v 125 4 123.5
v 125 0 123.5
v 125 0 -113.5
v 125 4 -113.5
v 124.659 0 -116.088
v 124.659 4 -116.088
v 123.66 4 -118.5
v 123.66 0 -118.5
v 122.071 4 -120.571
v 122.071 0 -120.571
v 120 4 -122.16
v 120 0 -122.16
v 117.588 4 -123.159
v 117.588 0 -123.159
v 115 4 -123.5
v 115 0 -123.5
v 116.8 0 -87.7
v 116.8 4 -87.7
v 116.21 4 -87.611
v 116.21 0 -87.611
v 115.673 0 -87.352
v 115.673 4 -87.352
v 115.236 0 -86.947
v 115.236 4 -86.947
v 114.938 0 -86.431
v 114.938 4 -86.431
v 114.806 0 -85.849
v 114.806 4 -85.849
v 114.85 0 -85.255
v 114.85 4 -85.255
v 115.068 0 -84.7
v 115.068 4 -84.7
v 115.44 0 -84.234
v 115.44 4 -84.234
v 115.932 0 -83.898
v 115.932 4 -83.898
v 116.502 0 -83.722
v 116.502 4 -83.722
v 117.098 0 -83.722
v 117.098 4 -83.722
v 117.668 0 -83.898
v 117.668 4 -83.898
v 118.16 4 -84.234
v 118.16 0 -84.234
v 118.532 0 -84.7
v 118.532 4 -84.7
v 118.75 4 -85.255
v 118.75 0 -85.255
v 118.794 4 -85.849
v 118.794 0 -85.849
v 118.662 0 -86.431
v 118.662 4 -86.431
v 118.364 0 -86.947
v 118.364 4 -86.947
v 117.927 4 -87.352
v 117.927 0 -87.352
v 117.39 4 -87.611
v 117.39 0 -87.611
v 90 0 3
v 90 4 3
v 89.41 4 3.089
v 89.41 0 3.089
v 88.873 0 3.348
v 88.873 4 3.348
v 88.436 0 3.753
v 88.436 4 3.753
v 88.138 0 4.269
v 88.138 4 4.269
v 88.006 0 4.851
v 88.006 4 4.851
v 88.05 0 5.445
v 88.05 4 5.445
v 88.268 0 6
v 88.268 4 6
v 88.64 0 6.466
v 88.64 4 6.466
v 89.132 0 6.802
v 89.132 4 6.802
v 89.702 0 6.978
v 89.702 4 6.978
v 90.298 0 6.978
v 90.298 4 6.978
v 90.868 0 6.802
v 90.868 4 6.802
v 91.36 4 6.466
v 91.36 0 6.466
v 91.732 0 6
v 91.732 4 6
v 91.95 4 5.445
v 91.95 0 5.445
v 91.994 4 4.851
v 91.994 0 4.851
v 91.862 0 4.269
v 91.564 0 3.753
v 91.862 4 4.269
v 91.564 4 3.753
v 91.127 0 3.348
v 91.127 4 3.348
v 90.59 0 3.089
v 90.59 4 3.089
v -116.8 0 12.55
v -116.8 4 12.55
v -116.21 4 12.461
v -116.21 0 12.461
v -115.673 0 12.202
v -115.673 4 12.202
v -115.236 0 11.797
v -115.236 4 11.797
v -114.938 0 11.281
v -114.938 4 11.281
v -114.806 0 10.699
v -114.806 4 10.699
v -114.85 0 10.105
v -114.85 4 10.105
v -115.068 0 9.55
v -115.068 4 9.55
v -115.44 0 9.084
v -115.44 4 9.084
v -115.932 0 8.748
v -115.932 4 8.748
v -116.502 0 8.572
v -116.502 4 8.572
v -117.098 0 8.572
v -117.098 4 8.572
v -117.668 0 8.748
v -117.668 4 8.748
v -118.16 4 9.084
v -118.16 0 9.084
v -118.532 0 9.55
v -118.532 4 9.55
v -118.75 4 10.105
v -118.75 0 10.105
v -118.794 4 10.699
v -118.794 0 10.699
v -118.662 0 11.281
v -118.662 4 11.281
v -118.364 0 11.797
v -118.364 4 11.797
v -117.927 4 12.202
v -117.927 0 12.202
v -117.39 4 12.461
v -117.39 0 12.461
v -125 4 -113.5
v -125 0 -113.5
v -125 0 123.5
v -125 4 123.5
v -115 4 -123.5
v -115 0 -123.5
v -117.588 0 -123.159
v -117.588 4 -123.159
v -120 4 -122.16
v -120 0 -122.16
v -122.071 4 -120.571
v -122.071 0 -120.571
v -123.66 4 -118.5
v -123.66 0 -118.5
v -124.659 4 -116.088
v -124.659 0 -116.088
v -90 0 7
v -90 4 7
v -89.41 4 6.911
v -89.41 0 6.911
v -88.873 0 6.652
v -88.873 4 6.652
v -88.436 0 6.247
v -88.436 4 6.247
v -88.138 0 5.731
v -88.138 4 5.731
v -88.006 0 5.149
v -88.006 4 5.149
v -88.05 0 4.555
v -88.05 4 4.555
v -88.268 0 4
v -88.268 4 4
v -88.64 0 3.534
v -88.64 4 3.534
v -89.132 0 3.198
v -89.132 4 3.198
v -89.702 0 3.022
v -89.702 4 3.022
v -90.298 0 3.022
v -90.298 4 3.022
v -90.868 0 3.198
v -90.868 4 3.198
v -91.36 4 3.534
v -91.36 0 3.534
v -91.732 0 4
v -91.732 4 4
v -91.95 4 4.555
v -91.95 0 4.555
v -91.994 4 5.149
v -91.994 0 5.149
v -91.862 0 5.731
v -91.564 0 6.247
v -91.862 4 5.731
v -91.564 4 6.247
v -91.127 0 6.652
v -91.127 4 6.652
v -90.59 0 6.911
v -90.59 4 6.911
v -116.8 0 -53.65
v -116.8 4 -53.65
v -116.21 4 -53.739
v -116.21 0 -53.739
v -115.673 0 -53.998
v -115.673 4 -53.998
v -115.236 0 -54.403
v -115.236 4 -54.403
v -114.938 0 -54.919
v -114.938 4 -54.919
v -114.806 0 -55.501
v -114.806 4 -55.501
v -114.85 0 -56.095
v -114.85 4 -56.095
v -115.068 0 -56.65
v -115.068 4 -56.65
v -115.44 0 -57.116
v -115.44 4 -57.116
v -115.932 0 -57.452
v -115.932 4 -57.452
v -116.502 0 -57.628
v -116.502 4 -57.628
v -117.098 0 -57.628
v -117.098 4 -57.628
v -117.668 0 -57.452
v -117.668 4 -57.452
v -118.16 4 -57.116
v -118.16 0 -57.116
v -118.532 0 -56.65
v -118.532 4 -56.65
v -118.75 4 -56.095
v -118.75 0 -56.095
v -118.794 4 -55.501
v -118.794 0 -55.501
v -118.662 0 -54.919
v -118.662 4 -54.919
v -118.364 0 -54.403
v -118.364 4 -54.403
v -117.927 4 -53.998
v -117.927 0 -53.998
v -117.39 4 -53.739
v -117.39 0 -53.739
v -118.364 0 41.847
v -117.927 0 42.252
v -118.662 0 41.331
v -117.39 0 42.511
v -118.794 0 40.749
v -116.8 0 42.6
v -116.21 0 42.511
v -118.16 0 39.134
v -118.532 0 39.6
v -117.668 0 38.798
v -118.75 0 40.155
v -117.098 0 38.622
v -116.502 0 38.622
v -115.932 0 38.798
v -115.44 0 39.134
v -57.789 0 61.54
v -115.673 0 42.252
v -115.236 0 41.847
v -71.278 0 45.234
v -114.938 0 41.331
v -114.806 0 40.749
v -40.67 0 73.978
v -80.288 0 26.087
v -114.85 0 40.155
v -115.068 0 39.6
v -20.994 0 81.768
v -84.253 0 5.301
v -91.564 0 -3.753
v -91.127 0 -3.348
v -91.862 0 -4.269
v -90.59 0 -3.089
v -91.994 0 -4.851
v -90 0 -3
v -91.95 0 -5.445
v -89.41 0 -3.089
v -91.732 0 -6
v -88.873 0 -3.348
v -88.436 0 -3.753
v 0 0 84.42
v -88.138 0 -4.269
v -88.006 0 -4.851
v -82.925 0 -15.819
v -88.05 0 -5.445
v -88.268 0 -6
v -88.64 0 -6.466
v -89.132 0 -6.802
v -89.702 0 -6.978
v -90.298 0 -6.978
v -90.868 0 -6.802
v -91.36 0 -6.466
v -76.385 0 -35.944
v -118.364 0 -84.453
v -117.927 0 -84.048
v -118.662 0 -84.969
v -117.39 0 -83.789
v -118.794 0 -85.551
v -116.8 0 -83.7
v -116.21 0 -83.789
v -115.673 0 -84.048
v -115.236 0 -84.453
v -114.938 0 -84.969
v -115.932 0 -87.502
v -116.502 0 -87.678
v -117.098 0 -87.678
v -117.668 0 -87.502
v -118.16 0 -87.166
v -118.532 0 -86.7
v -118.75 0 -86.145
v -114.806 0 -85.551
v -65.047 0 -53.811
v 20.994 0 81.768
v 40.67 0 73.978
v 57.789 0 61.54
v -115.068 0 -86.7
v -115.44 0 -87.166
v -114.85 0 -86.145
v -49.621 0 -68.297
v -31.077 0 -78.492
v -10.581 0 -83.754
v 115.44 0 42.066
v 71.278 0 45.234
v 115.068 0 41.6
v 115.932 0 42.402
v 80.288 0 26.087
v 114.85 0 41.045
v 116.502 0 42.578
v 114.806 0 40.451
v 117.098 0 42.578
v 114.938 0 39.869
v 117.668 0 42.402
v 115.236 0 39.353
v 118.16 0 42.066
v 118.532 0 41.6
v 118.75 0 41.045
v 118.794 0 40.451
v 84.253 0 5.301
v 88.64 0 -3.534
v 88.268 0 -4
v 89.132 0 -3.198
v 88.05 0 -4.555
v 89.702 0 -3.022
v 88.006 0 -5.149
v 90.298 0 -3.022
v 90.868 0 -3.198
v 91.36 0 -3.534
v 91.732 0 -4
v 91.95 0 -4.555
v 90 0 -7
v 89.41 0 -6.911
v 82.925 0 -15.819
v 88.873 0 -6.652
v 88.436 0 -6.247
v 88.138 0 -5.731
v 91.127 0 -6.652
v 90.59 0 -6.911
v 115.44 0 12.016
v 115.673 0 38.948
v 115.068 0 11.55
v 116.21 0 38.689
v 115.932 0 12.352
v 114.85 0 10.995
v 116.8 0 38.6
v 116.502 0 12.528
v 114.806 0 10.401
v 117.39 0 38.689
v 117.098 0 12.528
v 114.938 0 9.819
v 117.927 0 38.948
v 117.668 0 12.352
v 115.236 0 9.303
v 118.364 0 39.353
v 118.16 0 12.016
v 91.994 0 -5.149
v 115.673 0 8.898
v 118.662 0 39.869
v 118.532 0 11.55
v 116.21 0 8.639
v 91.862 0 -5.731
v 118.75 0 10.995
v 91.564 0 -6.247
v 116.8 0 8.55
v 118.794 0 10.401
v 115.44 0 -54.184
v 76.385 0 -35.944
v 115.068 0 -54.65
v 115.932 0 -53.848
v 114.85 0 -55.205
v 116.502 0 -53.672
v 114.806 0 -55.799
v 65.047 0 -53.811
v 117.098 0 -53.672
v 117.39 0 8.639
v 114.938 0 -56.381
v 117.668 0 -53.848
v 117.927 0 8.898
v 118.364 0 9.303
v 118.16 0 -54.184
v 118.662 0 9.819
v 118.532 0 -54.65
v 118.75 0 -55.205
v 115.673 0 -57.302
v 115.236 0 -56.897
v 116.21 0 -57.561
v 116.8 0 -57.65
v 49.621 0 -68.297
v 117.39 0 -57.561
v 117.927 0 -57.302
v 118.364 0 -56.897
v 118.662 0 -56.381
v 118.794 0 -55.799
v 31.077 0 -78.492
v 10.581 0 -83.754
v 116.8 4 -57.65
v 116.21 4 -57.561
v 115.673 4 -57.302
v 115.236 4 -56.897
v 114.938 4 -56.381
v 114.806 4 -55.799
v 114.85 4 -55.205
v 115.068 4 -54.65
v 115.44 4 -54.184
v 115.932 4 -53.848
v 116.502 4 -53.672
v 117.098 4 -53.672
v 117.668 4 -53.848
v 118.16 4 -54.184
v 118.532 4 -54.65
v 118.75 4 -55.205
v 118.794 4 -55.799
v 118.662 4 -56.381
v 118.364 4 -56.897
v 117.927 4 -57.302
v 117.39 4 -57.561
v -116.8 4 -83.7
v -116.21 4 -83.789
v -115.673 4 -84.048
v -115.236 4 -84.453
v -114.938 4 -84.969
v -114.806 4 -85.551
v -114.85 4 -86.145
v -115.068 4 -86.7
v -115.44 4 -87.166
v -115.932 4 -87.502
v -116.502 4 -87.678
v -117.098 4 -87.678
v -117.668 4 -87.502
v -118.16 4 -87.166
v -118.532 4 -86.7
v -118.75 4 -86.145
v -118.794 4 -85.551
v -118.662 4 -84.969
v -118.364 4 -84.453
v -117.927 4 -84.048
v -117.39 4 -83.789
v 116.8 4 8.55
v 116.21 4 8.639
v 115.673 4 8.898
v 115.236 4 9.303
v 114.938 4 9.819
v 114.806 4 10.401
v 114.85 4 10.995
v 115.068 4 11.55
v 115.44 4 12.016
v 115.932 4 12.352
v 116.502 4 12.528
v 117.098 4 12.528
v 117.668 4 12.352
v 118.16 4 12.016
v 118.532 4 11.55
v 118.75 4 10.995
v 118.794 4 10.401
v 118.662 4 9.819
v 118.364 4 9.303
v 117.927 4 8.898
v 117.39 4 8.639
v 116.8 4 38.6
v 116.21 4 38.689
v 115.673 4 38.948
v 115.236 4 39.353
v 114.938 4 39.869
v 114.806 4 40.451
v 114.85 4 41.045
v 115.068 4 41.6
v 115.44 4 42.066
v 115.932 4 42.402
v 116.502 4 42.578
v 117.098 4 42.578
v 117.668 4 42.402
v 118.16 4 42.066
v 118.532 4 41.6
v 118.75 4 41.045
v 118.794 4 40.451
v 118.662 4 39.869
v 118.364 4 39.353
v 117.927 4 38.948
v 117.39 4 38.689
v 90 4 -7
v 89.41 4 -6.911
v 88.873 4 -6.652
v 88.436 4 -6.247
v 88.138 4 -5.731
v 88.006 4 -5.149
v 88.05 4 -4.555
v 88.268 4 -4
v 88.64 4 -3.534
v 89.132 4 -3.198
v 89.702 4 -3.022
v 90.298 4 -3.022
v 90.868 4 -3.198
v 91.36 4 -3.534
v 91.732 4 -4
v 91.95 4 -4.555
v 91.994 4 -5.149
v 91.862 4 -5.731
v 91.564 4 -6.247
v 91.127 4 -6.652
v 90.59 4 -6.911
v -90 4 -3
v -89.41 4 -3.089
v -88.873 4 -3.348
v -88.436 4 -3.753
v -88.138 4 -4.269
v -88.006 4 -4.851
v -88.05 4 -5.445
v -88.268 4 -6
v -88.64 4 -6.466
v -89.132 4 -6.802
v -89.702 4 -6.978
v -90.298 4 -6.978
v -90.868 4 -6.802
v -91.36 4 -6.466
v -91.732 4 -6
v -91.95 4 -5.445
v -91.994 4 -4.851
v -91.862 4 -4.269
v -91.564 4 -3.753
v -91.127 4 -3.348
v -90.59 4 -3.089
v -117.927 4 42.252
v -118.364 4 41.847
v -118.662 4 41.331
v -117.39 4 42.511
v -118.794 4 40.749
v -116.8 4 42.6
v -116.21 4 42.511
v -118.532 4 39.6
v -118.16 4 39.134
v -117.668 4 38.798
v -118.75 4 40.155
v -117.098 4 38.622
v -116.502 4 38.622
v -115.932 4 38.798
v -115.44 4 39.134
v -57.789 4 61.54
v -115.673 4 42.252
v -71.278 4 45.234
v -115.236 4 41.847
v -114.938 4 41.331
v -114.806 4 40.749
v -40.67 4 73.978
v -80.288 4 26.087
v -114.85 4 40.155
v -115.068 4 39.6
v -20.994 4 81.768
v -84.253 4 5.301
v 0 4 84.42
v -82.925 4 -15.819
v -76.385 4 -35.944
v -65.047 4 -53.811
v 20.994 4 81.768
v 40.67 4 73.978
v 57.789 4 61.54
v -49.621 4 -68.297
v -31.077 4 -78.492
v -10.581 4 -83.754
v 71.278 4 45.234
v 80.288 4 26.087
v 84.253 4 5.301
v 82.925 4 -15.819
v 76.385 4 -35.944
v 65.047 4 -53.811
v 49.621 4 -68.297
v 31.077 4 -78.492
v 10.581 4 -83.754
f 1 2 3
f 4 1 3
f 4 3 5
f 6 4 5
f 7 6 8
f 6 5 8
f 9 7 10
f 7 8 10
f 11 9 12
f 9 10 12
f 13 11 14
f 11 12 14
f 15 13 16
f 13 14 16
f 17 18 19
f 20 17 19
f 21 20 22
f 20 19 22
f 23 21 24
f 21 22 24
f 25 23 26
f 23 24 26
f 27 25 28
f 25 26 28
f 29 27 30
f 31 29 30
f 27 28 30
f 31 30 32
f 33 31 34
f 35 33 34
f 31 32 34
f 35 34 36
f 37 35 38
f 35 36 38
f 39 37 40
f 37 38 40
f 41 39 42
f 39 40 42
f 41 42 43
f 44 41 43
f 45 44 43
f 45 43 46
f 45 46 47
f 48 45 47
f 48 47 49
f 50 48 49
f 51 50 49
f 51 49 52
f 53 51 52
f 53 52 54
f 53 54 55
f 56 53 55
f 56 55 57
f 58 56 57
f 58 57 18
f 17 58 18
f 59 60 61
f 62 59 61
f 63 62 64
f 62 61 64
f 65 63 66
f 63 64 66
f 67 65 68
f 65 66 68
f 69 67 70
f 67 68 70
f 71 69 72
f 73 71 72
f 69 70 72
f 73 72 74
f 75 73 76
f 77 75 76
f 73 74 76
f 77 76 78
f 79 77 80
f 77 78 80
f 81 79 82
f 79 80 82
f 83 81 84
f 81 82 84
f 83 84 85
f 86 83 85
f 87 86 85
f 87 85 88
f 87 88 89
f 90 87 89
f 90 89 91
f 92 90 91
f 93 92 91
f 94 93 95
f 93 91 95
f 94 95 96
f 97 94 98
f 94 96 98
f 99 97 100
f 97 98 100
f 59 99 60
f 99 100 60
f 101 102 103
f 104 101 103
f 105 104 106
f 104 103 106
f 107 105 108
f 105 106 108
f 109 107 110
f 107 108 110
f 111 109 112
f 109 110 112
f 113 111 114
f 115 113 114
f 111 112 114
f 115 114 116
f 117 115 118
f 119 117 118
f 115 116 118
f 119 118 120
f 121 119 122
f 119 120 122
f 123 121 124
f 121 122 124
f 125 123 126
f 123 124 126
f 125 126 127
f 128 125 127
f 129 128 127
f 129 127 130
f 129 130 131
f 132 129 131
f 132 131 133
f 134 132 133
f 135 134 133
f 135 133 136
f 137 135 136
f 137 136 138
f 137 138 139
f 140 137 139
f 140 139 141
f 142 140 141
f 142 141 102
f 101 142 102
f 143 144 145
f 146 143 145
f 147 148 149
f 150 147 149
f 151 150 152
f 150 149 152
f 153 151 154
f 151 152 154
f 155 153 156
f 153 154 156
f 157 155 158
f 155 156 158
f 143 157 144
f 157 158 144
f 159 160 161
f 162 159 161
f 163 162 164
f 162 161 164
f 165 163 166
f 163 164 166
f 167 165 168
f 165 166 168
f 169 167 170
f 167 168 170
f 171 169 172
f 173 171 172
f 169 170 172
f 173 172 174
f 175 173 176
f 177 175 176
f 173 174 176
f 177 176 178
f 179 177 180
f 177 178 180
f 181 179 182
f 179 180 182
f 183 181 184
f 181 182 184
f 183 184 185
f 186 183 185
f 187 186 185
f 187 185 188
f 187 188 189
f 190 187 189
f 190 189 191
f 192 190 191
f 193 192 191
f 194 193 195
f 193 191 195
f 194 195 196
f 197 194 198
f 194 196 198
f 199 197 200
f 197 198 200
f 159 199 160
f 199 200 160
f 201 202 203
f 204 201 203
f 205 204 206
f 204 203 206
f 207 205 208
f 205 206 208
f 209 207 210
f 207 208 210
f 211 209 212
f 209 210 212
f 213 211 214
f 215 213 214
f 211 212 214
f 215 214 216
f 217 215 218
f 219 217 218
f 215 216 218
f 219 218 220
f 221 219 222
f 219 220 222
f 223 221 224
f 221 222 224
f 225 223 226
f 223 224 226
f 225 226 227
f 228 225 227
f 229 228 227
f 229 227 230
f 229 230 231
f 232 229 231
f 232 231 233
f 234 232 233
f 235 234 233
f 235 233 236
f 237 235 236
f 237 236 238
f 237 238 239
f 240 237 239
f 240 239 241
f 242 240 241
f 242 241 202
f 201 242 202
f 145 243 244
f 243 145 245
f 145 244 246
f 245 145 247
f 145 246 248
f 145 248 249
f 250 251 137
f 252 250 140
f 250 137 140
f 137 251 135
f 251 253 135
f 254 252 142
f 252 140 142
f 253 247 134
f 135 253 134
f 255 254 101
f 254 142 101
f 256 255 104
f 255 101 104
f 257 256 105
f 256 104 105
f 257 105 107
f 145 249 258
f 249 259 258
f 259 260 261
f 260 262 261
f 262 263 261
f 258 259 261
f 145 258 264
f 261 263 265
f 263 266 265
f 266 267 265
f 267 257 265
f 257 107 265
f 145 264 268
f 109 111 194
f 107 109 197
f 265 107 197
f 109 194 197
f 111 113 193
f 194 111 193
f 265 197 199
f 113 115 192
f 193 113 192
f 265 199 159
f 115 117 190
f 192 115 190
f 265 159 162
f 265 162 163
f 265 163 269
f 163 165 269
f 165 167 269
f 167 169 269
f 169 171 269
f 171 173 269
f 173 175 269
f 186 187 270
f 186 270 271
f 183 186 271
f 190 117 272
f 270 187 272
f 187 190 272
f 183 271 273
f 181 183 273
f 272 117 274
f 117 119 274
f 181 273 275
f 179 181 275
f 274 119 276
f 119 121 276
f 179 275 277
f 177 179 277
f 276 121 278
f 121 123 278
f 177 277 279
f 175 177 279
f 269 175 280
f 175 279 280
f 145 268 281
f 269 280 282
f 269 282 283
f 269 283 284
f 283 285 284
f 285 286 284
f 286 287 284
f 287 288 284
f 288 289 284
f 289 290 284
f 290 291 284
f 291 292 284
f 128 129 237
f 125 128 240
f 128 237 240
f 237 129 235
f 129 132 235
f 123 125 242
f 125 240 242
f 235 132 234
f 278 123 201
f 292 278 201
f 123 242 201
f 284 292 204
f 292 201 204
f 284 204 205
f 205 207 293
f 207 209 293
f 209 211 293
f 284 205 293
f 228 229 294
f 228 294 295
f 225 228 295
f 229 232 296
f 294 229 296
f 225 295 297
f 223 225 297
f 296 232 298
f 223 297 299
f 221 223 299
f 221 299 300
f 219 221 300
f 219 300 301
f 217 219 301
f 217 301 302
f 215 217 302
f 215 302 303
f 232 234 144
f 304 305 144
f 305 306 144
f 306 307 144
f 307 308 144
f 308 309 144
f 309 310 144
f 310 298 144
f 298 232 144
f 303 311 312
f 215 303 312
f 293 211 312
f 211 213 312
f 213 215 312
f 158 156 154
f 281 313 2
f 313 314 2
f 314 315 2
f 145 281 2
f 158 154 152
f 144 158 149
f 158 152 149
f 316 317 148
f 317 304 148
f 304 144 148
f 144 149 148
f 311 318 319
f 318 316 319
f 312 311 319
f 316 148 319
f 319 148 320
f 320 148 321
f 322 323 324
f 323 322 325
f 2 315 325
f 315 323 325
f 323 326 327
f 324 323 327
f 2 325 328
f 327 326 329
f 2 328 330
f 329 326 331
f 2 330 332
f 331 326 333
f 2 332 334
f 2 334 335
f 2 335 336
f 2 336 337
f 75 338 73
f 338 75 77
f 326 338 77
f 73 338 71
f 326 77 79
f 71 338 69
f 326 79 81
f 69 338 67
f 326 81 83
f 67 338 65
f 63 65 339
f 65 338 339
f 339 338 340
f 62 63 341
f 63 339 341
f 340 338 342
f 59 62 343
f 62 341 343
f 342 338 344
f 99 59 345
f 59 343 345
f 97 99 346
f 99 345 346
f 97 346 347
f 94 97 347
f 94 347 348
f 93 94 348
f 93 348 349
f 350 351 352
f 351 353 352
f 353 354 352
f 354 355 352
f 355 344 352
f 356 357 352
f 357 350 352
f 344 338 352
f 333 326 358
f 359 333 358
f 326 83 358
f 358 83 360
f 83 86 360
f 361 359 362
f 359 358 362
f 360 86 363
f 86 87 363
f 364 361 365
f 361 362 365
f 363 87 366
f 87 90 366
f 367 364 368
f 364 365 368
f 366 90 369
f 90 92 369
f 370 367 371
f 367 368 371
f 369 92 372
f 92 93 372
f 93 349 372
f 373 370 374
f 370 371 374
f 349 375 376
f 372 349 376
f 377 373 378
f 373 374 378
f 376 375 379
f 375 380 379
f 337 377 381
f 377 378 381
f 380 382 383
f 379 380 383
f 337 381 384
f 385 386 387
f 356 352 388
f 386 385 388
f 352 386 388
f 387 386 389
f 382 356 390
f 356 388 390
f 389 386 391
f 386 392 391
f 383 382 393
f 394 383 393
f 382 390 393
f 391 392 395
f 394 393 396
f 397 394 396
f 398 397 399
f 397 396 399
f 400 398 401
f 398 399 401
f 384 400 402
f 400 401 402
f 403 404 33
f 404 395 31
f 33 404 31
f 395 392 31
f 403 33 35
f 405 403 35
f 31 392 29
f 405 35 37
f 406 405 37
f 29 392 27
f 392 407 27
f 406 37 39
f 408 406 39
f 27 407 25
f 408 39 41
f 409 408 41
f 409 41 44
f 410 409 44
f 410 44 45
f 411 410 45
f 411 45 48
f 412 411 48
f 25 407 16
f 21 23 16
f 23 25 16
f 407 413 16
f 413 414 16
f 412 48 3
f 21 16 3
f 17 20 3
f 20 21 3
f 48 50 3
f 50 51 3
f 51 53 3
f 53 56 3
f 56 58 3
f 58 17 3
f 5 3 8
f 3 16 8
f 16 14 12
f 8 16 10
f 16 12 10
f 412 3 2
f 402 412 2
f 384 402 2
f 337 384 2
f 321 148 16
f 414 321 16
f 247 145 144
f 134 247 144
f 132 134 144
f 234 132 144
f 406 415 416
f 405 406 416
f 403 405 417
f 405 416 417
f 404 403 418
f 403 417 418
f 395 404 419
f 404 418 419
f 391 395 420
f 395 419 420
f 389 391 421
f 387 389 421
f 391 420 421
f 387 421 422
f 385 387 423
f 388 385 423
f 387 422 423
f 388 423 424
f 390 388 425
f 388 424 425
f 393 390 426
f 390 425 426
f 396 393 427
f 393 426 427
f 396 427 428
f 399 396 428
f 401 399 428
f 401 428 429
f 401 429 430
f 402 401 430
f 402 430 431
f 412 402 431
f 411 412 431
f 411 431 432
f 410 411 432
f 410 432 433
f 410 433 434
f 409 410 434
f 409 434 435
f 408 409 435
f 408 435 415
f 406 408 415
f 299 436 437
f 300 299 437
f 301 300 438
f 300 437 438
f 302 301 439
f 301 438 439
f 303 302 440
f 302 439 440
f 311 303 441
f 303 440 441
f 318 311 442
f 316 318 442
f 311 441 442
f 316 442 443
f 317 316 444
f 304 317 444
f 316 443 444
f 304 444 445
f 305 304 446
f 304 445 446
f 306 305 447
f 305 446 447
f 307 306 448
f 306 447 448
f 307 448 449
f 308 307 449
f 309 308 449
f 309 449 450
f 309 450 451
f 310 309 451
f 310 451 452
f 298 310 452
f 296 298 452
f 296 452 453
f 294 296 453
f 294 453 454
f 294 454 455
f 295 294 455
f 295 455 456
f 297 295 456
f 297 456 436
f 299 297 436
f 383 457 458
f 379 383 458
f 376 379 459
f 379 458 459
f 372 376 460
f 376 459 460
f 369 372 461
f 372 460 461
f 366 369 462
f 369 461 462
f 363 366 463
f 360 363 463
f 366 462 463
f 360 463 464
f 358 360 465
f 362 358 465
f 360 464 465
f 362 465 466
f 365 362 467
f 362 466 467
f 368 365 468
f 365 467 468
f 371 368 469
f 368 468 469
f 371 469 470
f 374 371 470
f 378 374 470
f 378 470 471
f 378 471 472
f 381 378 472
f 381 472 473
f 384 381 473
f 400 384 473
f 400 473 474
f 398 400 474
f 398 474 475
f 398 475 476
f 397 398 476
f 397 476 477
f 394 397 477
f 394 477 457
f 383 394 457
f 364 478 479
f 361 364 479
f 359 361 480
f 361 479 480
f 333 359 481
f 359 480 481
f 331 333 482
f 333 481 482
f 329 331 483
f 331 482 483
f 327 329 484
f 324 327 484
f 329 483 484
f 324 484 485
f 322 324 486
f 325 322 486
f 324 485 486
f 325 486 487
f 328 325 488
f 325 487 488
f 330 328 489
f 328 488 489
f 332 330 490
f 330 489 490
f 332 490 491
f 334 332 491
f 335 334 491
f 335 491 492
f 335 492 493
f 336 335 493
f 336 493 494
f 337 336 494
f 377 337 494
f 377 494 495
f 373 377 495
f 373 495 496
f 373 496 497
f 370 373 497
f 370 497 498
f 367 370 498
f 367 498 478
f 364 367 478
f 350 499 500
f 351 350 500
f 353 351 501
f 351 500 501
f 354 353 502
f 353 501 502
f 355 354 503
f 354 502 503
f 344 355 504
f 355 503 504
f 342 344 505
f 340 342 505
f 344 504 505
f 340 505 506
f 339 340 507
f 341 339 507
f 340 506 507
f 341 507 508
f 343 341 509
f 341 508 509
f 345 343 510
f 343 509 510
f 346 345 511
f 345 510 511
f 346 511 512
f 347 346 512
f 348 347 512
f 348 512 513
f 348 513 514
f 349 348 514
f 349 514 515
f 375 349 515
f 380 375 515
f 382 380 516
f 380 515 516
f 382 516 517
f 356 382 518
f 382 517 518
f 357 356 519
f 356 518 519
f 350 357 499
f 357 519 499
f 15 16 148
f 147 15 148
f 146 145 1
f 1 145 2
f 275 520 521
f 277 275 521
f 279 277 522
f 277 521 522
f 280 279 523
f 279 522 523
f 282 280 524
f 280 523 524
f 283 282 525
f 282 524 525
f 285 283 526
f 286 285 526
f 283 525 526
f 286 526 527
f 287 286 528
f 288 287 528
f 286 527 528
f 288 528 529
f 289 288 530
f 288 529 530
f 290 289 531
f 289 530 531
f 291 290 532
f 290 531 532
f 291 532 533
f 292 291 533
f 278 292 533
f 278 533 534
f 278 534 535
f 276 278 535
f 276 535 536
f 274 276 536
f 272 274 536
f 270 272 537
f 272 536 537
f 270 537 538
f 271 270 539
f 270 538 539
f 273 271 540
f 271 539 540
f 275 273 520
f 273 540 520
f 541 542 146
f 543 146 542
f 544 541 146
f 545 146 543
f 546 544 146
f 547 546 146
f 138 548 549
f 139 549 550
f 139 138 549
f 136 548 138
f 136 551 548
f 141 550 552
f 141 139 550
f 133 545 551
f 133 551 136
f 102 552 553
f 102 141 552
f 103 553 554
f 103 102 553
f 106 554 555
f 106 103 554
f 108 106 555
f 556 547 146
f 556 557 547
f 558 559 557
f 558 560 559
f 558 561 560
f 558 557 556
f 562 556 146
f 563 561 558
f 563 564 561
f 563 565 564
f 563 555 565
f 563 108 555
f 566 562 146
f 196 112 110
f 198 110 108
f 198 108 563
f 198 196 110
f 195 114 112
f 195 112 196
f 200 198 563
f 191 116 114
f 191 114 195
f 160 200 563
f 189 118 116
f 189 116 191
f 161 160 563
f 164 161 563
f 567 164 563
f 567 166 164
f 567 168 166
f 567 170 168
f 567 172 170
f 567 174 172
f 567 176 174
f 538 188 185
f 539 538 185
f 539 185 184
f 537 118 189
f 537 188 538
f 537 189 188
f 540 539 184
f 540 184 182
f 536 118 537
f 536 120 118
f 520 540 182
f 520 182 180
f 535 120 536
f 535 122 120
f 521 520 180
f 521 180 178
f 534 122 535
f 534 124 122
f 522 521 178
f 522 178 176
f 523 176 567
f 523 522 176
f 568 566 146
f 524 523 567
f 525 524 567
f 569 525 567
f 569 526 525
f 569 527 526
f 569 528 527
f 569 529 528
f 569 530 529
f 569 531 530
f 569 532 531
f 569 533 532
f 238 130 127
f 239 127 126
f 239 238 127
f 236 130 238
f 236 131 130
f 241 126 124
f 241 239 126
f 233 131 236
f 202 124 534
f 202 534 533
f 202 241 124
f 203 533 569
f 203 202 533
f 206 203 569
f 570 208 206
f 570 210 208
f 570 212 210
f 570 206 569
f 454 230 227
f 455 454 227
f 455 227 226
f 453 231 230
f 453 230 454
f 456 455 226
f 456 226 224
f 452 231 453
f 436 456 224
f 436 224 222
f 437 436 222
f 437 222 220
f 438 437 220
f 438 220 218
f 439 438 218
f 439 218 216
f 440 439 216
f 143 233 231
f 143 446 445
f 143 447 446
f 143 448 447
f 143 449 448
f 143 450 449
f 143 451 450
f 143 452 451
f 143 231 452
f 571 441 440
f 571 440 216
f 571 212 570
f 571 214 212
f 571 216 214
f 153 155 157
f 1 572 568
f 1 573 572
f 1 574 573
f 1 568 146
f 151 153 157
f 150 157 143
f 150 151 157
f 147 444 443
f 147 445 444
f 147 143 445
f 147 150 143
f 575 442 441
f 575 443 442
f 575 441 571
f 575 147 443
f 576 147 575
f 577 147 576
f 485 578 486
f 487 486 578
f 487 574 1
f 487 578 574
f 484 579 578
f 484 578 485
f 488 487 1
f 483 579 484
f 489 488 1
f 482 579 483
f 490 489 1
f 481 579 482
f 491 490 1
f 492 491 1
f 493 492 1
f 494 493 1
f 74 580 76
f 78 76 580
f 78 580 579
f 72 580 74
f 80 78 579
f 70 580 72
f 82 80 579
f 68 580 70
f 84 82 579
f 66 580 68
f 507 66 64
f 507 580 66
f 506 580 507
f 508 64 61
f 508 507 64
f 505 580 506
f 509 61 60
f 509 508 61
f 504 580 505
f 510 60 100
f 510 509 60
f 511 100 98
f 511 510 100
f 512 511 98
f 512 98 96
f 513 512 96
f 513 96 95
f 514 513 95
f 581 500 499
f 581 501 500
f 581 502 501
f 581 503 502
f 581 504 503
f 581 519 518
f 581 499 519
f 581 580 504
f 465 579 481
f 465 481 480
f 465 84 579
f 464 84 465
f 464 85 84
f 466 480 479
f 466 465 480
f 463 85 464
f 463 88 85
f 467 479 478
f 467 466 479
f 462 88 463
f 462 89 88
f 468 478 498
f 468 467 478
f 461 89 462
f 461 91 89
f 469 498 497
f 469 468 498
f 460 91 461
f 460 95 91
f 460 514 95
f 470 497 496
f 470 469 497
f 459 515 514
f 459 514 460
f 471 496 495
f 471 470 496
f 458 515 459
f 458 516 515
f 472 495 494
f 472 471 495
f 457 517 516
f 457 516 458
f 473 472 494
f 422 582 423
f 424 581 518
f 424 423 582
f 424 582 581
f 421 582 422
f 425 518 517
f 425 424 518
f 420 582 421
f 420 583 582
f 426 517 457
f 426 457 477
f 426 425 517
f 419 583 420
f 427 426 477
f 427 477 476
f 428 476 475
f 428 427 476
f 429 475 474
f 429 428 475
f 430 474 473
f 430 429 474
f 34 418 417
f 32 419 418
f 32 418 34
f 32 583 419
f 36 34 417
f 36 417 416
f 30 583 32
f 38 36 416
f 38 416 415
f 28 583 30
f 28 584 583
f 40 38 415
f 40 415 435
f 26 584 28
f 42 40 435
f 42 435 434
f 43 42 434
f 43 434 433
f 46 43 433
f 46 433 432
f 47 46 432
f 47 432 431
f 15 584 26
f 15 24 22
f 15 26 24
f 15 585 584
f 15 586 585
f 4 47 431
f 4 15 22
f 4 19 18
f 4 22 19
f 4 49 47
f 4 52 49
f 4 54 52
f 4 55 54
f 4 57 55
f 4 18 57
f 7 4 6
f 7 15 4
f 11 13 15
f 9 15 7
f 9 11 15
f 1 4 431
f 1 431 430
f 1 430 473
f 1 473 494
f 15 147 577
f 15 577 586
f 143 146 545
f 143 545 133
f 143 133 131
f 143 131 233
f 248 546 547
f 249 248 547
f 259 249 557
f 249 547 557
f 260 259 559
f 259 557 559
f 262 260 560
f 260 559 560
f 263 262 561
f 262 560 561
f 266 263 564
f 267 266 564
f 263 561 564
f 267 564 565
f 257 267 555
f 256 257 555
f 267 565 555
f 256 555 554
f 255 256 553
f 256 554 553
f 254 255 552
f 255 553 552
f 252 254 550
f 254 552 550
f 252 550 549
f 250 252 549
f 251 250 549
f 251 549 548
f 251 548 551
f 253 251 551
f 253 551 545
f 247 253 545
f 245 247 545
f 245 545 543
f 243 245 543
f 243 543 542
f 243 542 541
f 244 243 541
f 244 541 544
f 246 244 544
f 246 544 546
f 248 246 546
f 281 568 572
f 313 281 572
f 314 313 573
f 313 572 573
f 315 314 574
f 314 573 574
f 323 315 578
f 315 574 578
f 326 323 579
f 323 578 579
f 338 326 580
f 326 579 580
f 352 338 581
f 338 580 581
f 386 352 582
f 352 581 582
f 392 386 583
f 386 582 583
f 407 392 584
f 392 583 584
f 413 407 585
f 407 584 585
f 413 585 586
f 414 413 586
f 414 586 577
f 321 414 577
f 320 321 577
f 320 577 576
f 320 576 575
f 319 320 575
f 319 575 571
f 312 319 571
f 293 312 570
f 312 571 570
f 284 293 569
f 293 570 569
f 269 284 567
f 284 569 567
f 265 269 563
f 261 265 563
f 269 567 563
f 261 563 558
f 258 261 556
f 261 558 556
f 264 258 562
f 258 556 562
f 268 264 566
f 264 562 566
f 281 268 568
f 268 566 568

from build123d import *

# Parameters (mm, degrees)
SALIENTE_EXTRUIR1_DEPTH = 4
CROQUIS2_R              = 84.42
CROQUIS2_R_2            = 2
CORTAR_EXTRUIR1_DEPTH   = 4
CROQUIS3_R              = 2
CORTAR_EXTRUIR2_DEPTH   = 10


with BuildPart() as part:
    # Croquis1 → Saliente-Extruir1 (new body)
    with BuildSketch(Plane(origin=(0, 0, 0), x_dir=(1, 0, 0), z_dir=(0, 1, 0))):
        with BuildLine():
            Line((-125, -123.5), (125, -123.5))
            Line((125, -123.5), (125, 113.5))
            ThreePointArc((125, 113.5), (122.071067812, 120.571067812), (115, 123.5))
            Line((115, 123.5), (-115, 123.5))
            ThreePointArc((-115, 123.5), (-122.071067812, 120.571067812), (-125, 113.5))
            Line((-125, 113.5), (-125, -123.5))
        make_face()
    extrude(amount=SALIENTE_EXTRUIR1_DEPTH)

    # Croquis2 → Cortar-Extruir1 (cut)
    with BuildSketch(Plane(origin=(0, 4, 0), x_dir=(1, 0, 0), z_dir=(0, 1, 0))):
        with Locations(Location((0, 0, 0), (0, 0, 270))):
            Circle(CROQUIS2_R)
        with Locations(Location((-90, 5, 0), (0, 0, 270))):
            Circle(CROQUIS2_R_2)
        with Locations(Location((-90, -5, 0), (0, 0, 270))):
            Circle(CROQUIS2_R_2)
        with Locations(Location((90, -5, 0), (0, 0, 90))):
            Circle(CROQUIS2_R_2)
        with Locations(Location((90, 5, 0), (0, 0, 90))):
            Circle(CROQUIS2_R_2)
    extrude(amount=-CORTAR_EXTRUIR1_DEPTH, mode=Mode.SUBTRACT)

    # Croquis3 → Cortar-Extruir2 (cut)
    with BuildSketch(Plane(origin=(0, 4, 0), x_dir=(1, 0, 0), z_dir=(0, 1, 0))):
        with Locations(Location((-116.8, 85.7, 0), (0, 0, 270))):
            Circle(CROQUIS3_R)
        with Locations(Location((-116.8, 55.65, 0), (0, 0, 270))):
            Circle(CROQUIS3_R)
        with Locations(Location((-116.8, -10.55, 0), (0, 0, 270))):
            Circle(CROQUIS3_R)
        with Locations(Location((-116.8, -40.6, 0), (0, 0, 270))):
            Circle(CROQUIS3_R)
        with Locations(Location((116.8, -40.6, 0), (0, 0, 90))):
            Circle(CROQUIS3_R)
        with Locations(Location((116.8, -10.55, 0), (0, 0, 90))):
            Circle(CROQUIS3_R)
        with Locations(Location((116.8, 55.65, 0), (0, 0, 90))):
            Circle(CROQUIS3_R)
        with Locations(Location((116.8, 85.7, 0), (0, 0, 90))):
            Circle(CROQUIS3_R)
    extrude(amount=-CORTAR_EXTRUIR2_DEPTH, mode=Mode.SUBTRACT)


solid = part.part
